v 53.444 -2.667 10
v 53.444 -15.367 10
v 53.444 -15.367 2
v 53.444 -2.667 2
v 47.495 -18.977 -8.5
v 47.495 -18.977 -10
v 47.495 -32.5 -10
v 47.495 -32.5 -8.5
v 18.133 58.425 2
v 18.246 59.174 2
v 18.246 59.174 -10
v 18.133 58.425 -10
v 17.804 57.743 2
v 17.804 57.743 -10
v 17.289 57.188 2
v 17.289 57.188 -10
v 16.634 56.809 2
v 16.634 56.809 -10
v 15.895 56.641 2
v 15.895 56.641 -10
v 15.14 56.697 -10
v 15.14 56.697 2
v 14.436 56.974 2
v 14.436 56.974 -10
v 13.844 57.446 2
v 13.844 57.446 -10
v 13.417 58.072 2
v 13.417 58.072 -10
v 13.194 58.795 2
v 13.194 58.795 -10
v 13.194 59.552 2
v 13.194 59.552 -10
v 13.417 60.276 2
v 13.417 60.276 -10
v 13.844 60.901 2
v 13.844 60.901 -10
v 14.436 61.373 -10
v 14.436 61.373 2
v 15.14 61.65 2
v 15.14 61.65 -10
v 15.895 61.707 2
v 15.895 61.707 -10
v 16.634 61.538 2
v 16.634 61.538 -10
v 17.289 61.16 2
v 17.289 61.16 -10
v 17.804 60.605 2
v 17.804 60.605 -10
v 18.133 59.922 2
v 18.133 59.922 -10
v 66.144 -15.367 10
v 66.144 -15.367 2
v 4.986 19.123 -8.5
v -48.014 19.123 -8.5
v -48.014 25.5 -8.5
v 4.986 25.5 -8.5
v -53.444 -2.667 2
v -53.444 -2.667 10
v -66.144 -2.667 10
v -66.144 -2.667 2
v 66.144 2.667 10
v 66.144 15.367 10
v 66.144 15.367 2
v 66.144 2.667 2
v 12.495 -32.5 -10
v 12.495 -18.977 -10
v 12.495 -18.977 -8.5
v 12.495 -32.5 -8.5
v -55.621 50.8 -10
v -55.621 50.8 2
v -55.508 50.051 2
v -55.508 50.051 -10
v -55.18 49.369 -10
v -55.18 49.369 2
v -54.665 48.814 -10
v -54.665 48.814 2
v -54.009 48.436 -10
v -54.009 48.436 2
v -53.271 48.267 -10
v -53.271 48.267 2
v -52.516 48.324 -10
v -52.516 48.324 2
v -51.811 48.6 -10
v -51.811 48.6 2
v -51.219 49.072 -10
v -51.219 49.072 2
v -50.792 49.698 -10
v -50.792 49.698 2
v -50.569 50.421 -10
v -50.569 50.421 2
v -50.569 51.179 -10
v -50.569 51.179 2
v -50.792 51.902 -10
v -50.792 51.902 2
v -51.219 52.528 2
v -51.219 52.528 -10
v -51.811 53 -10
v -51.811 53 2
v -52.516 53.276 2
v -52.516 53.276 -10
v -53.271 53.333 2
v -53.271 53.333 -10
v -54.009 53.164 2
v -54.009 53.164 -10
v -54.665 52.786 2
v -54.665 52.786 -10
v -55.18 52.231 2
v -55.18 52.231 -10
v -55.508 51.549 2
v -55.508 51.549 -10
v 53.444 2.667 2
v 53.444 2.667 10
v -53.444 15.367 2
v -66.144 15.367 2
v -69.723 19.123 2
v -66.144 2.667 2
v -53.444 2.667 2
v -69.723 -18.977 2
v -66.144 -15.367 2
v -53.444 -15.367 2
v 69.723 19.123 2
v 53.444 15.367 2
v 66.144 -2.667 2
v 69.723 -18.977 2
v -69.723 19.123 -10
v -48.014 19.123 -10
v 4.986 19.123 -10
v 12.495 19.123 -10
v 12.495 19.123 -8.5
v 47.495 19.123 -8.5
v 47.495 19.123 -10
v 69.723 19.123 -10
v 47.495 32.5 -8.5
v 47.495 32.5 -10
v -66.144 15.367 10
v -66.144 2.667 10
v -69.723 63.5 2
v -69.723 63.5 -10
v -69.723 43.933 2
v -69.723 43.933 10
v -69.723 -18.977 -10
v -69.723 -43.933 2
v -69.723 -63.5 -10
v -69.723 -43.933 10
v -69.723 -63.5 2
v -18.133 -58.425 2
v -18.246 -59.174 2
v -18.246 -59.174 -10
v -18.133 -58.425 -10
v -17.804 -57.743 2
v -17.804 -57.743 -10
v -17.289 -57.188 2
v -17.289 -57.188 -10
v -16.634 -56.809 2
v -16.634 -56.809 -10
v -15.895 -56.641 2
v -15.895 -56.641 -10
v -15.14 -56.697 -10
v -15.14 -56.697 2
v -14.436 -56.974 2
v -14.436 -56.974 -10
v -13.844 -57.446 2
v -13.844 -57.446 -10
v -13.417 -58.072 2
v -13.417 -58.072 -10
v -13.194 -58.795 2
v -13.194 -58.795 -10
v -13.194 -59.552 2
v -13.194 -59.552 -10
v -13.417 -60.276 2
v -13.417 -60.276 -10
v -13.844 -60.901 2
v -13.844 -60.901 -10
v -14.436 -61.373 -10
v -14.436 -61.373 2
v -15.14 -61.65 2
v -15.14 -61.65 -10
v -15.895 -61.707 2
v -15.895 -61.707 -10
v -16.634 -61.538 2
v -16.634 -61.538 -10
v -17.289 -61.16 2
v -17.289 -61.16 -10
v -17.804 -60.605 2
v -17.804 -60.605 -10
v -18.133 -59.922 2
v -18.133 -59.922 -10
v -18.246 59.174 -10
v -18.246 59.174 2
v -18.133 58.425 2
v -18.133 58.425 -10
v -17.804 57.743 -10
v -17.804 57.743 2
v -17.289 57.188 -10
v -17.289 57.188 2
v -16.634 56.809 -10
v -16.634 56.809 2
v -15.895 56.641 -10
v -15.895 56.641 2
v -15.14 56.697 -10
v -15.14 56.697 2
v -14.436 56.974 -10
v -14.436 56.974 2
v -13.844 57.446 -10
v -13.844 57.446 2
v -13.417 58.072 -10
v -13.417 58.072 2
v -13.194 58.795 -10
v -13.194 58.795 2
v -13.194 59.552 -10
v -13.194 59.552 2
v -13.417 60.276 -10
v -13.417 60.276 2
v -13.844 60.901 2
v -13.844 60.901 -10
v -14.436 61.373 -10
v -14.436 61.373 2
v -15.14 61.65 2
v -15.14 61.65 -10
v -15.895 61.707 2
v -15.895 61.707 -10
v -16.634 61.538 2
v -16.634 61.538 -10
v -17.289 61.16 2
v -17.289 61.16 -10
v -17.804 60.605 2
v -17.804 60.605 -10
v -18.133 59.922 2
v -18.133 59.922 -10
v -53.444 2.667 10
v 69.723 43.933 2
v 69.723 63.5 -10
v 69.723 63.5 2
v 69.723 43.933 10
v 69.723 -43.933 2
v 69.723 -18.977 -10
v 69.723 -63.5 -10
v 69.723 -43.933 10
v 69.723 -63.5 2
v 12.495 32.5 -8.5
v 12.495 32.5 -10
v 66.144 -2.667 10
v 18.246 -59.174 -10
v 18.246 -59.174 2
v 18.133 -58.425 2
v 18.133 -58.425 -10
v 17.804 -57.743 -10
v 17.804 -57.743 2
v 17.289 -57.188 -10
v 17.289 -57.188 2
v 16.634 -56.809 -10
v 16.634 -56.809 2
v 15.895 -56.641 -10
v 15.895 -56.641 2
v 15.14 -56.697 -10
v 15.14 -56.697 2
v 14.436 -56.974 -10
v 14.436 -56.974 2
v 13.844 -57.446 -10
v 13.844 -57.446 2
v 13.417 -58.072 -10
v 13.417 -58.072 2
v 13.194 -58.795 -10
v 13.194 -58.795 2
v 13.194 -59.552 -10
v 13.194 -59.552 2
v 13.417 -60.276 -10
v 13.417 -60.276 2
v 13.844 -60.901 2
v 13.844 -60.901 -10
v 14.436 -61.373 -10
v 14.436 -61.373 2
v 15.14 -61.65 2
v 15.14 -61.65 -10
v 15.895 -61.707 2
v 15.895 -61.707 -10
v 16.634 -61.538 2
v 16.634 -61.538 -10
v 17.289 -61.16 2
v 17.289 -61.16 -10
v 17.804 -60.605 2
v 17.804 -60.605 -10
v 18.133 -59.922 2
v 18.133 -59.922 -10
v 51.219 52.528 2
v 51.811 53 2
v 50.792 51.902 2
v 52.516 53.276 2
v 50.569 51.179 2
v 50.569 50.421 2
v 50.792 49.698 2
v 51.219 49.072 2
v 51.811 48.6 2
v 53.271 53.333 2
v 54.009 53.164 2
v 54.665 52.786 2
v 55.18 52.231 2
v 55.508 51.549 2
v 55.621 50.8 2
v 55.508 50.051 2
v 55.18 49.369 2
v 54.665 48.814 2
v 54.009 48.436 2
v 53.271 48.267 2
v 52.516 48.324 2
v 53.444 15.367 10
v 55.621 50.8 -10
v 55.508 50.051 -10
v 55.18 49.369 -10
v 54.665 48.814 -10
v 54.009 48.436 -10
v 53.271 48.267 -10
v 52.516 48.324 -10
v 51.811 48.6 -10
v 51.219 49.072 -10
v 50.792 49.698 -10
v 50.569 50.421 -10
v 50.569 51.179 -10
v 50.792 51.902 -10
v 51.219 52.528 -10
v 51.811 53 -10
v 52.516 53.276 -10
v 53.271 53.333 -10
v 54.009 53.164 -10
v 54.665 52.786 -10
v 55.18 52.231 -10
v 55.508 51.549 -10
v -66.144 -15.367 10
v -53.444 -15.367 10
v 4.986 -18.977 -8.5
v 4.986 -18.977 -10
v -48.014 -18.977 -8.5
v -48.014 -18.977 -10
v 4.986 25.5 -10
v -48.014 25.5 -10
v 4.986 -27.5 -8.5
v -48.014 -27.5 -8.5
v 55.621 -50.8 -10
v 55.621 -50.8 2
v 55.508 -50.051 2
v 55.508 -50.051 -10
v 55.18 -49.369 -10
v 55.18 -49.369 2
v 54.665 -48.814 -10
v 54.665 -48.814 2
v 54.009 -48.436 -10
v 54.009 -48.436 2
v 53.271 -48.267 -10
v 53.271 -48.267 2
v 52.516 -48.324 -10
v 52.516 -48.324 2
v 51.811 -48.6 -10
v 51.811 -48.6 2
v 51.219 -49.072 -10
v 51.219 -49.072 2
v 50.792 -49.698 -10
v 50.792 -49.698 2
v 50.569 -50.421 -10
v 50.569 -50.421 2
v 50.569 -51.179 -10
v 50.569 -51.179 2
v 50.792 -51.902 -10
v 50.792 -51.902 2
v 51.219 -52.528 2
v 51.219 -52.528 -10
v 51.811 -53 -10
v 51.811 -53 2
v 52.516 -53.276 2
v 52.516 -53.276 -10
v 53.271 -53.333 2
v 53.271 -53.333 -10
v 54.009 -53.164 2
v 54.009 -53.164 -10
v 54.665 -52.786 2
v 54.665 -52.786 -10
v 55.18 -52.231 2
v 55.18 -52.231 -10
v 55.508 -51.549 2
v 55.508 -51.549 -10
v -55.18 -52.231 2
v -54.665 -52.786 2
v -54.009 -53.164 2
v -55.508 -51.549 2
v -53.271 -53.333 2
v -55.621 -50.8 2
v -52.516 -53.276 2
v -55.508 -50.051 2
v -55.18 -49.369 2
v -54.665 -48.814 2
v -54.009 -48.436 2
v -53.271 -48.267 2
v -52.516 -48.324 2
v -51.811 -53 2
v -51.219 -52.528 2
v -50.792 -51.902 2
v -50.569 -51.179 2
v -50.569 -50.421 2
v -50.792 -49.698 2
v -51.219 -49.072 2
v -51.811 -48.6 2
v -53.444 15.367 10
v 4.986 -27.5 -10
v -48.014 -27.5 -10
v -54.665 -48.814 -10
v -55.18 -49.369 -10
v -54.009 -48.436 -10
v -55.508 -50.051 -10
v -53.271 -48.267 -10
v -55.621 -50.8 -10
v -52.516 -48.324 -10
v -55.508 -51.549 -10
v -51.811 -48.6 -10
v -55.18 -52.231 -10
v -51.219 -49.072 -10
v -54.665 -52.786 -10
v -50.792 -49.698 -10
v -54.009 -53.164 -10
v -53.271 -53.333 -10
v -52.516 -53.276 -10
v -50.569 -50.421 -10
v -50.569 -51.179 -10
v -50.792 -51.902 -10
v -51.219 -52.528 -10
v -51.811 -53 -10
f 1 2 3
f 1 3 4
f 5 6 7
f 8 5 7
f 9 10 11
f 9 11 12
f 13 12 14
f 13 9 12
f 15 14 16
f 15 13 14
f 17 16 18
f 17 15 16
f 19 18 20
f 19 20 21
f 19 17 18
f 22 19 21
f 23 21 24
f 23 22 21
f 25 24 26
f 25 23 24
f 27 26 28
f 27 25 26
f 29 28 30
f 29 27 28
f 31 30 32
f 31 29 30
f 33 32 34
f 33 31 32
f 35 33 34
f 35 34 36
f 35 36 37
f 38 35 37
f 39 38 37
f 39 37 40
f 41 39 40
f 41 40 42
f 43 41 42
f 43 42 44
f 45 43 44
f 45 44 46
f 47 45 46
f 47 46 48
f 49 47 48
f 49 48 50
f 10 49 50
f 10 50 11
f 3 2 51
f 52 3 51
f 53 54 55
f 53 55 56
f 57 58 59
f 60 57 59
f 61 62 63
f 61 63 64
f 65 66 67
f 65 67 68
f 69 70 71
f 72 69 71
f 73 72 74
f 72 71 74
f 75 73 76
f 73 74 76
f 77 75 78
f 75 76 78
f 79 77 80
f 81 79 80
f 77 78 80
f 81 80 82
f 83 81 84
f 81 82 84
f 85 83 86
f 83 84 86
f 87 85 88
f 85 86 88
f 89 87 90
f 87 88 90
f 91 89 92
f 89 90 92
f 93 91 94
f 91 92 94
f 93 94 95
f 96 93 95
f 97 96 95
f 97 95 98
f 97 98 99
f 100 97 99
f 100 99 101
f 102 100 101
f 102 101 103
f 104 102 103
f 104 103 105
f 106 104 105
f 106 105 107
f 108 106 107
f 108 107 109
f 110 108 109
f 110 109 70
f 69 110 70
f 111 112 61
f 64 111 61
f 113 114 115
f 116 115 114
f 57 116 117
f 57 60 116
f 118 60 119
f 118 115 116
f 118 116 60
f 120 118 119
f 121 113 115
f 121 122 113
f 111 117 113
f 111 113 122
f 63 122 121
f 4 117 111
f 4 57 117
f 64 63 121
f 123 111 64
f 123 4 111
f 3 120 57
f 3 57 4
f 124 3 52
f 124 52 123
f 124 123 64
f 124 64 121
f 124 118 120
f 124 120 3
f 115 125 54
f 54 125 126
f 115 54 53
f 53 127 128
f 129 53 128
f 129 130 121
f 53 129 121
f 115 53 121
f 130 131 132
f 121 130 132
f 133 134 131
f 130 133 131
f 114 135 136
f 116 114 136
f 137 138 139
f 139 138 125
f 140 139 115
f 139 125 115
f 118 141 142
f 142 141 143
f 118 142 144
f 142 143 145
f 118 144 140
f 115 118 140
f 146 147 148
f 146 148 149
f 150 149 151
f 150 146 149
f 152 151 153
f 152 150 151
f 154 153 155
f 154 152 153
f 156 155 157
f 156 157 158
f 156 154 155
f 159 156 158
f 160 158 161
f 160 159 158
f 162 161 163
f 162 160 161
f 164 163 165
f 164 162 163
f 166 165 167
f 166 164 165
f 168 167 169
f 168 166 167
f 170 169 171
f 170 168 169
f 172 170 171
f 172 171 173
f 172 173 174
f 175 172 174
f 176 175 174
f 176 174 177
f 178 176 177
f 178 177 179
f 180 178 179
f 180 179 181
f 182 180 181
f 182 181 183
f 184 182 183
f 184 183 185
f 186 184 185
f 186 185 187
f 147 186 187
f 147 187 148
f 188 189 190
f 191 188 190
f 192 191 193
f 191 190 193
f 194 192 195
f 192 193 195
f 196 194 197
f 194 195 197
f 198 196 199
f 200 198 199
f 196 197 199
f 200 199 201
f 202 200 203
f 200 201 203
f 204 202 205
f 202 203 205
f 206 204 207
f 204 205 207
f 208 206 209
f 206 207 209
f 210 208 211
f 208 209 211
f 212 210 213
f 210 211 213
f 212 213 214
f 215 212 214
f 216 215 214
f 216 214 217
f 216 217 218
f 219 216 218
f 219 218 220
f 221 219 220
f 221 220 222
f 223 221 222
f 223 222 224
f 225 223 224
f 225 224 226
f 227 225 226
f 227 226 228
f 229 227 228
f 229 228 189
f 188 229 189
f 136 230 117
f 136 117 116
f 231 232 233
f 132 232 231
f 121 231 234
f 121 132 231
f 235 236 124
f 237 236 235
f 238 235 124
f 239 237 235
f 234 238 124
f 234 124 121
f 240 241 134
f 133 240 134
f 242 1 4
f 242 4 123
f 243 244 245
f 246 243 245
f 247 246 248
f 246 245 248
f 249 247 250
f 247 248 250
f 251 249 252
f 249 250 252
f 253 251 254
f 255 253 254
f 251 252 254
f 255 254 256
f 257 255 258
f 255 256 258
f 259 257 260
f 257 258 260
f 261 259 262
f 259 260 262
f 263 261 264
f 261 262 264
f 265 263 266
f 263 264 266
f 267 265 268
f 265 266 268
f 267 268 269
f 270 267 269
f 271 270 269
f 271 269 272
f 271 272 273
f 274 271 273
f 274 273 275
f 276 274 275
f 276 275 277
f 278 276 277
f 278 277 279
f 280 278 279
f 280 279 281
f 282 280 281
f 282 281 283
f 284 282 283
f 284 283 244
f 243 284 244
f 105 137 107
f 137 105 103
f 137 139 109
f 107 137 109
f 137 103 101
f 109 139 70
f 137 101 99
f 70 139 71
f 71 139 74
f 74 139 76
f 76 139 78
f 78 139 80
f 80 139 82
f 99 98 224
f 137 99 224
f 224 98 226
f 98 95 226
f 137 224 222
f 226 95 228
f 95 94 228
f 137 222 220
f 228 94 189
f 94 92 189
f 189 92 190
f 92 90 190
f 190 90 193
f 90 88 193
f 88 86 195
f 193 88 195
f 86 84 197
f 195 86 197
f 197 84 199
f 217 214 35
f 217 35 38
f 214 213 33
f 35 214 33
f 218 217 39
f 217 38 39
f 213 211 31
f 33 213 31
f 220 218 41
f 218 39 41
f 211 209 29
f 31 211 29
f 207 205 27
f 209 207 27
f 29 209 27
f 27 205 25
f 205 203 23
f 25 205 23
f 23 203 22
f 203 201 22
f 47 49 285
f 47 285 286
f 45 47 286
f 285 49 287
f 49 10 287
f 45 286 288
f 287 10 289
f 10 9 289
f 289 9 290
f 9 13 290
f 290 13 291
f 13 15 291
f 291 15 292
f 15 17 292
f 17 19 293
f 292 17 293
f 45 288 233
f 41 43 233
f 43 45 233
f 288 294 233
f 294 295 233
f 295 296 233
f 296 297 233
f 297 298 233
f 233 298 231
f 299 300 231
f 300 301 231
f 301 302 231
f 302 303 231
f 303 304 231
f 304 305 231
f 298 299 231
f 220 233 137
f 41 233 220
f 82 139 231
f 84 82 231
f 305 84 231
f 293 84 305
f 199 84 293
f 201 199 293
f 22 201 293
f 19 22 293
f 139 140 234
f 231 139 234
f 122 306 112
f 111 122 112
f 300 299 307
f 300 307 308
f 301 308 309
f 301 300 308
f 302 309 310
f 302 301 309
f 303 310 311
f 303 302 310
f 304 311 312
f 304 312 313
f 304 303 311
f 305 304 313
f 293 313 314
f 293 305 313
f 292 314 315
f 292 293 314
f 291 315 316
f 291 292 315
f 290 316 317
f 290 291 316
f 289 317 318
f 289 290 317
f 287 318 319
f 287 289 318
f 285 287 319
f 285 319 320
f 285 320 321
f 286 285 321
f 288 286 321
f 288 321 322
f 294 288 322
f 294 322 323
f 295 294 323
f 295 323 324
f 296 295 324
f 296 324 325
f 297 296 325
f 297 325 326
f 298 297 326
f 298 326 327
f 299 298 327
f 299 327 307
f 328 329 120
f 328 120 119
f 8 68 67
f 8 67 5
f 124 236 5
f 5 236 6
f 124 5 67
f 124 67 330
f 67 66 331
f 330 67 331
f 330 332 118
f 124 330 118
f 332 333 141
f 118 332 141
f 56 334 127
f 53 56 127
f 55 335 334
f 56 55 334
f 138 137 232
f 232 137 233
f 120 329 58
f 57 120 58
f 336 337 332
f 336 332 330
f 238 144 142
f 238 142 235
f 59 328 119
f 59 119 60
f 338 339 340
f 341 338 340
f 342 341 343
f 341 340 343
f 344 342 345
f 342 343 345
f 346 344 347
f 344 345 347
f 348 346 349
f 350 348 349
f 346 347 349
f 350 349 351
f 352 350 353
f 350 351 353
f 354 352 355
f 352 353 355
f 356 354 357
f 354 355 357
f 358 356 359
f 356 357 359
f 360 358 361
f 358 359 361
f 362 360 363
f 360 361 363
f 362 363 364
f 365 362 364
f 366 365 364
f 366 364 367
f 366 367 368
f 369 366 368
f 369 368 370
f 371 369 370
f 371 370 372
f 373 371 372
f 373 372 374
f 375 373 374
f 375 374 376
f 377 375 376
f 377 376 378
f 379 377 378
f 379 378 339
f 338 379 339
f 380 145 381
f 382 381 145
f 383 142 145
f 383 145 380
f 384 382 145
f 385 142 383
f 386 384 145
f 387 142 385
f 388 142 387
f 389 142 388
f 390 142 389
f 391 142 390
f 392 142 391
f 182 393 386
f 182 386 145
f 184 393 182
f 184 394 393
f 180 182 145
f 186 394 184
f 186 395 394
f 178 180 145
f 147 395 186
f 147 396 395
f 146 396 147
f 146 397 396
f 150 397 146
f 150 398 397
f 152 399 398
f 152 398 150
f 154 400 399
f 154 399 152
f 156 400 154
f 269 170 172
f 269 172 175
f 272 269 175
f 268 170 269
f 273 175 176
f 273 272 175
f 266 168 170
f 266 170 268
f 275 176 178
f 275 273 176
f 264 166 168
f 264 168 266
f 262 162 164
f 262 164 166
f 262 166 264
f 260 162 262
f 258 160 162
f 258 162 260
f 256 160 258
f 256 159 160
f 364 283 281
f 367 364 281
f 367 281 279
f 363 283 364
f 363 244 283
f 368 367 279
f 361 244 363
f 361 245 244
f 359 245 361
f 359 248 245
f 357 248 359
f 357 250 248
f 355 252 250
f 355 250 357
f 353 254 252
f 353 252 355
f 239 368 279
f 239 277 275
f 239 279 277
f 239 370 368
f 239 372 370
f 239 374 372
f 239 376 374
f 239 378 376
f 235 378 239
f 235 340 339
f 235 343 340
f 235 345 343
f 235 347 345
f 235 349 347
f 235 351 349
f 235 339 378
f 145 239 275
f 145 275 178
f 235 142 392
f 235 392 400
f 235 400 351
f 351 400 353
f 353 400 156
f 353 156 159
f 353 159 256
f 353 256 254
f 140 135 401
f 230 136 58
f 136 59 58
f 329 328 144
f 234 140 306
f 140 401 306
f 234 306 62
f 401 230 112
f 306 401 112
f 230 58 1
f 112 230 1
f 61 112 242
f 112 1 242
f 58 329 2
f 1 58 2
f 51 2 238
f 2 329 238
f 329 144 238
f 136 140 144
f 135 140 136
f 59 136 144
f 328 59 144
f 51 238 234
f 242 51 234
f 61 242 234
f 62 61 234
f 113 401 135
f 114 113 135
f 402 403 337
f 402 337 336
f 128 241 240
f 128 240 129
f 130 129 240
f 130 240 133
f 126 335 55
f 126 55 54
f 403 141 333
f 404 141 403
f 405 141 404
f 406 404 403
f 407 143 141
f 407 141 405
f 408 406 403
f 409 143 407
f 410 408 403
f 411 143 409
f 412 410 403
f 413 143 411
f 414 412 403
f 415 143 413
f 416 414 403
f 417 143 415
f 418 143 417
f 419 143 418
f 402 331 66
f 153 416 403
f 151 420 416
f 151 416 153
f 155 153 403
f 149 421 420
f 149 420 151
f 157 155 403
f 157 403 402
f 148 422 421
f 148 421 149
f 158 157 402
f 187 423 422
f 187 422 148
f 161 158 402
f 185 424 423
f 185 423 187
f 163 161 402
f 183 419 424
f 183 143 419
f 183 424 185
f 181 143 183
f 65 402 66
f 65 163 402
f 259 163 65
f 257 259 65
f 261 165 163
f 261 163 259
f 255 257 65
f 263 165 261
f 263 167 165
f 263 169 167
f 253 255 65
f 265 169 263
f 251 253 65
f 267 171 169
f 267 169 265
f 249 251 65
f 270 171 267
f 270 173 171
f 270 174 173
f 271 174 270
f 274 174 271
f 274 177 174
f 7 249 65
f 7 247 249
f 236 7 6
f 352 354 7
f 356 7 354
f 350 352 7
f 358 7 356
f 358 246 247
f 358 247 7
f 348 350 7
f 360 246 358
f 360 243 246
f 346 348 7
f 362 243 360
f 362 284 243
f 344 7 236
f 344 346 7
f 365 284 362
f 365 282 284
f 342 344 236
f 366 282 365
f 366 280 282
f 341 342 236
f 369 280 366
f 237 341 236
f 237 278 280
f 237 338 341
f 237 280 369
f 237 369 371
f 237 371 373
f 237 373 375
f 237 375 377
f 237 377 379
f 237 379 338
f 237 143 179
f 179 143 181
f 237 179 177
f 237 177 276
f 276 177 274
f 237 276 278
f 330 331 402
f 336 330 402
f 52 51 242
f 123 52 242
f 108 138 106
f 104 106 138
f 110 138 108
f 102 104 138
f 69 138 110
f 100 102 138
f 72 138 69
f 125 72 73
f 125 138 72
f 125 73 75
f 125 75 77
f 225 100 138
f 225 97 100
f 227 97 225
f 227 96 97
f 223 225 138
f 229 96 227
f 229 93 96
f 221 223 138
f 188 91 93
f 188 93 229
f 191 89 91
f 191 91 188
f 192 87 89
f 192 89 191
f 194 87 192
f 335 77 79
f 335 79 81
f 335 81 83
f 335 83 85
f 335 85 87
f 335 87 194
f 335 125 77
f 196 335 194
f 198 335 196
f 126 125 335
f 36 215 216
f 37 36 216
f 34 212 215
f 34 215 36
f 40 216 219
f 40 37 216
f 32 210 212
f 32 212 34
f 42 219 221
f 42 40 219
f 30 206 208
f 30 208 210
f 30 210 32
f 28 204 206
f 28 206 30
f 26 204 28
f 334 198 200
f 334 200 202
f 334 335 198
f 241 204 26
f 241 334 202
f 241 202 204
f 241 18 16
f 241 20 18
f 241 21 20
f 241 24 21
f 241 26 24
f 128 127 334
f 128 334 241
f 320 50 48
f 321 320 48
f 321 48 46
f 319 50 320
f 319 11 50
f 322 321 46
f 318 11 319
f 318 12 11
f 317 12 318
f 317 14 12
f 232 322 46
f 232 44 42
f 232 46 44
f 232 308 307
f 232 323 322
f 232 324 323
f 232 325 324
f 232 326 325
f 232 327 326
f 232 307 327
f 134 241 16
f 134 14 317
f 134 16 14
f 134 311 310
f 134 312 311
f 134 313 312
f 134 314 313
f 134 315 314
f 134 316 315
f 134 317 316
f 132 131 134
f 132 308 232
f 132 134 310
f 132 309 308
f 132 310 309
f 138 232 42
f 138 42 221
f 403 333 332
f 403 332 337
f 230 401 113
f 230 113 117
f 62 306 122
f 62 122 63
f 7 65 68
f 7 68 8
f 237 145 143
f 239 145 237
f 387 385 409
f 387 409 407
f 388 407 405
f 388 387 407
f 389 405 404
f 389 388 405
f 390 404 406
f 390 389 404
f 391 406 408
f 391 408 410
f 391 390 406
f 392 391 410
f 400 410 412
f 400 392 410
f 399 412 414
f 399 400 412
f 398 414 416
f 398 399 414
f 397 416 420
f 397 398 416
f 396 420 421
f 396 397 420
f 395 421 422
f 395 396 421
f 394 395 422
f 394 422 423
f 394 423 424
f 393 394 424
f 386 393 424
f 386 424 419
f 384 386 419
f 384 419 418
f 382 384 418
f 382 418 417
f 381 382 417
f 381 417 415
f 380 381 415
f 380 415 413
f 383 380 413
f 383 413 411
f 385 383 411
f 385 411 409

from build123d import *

# Parameters (mm, degrees)
F0_W      = 139.446
F0_H      = 20
F1_DEPTH  = 63.5
F2_W      = 139.446
F2_H      = 19.567398
F3_DEPTH  = 8.000009
F5_W      = 12.7
F5_H      = 12.7
F6_DEPTH  = 21.844
F8_R      = 2.54
F9_DEPTH  = 76.2
F13_W     = 53
F13_H     = 53
F13_W_2   = 35
F13_H_2   = 65
F14_DEPTH = 1.5
F15_DEPTH = 12.000001


with BuildPart() as f1:
    # F0 (on Front) → F1 (new body, symmetric)
    with BuildSketch(Plane.XZ):
        Rectangle(F0_W, F0_H)
    extrude(amount=F1_DEPTH, both=True)

    # F2 (on face) → F3 (cut)
    with BuildSketch(Plane.XY.offset(10)):
        with Locations((0, -53.716301)):
            Rectangle(F2_W, F2_H)
    extrude(amount=-F3_DEPTH, mode=Mode.SUBTRACT)

    # F4: F1 across plane


with BuildPart() as f1_1:
    add(f1.part)
    add(f1.part.mirror(Plane.XZ), mode=Mode.INTERSECT)

    # F5 (on face) → F6 (cut)
    with BuildSketch(Plane.XY.offset(10)):
        with Locations((59.793662, -9.017324)):
            Rectangle(F5_W, F5_H)
    extrude(amount=-F6_DEPTH, mode=Mode.SUBTRACT)

    # F8 (on face) → F9 (cut)
    with BuildSketch(Plane.XY.offset(1.999991)):
        with Locations((53.08092, -50.8)):
            Circle(F8_R)
        with Locations((15.705684, -59.173669)):
            Circle(F8_R)
    extrude(amount=-F9_DEPTH, mode=Mode.SUBTRACT)

    # F10: F1 across plane


with BuildPart() as f1_2:
    add(f1_1.part)
    add(f1_1.part.mirror(Plane.XZ), mode=Mode.INTERSECT)

    # F11: F1 across plane


with BuildPart() as f1_3:
    add(f1_2.part)
    add(f1_2.part.mirror(Plane.YZ), mode=Mode.INTERSECT)

    # F13 (on face) → F14 (cut)
    with BuildSketch(Plane(origin=(0, 0, -10), x_dir=(1, 0, 0), z_dir=(0, 0, -1))):
        with Locations((-21.51399, 1)):
            Rectangle(F13_W, F13_H)
        with Locations((29.994886, 0)):
            Rectangle(F13_W_2, F13_H_2)
    extrude(amount=-F14_DEPTH, mode=Mode.SUBTRACT)

    # F12 (on face) → F15 (cut)
    with BuildSketch(Plane(origin=(0, 0, -10), x_dir=(1, 0, 0), z_dir=(0, 0, -1))):
        Polygon((69.723, -19.123085), (69.723, 18.976915), (1.722882, 18.976915), (-69.723, 18.976915), (-69.723, -19.123085), (1.722882, -19.123085), align=None)
    extrude(amount=-F15_DEPTH, mode=Mode.SUBTRACT)


solid = f1_3.part
